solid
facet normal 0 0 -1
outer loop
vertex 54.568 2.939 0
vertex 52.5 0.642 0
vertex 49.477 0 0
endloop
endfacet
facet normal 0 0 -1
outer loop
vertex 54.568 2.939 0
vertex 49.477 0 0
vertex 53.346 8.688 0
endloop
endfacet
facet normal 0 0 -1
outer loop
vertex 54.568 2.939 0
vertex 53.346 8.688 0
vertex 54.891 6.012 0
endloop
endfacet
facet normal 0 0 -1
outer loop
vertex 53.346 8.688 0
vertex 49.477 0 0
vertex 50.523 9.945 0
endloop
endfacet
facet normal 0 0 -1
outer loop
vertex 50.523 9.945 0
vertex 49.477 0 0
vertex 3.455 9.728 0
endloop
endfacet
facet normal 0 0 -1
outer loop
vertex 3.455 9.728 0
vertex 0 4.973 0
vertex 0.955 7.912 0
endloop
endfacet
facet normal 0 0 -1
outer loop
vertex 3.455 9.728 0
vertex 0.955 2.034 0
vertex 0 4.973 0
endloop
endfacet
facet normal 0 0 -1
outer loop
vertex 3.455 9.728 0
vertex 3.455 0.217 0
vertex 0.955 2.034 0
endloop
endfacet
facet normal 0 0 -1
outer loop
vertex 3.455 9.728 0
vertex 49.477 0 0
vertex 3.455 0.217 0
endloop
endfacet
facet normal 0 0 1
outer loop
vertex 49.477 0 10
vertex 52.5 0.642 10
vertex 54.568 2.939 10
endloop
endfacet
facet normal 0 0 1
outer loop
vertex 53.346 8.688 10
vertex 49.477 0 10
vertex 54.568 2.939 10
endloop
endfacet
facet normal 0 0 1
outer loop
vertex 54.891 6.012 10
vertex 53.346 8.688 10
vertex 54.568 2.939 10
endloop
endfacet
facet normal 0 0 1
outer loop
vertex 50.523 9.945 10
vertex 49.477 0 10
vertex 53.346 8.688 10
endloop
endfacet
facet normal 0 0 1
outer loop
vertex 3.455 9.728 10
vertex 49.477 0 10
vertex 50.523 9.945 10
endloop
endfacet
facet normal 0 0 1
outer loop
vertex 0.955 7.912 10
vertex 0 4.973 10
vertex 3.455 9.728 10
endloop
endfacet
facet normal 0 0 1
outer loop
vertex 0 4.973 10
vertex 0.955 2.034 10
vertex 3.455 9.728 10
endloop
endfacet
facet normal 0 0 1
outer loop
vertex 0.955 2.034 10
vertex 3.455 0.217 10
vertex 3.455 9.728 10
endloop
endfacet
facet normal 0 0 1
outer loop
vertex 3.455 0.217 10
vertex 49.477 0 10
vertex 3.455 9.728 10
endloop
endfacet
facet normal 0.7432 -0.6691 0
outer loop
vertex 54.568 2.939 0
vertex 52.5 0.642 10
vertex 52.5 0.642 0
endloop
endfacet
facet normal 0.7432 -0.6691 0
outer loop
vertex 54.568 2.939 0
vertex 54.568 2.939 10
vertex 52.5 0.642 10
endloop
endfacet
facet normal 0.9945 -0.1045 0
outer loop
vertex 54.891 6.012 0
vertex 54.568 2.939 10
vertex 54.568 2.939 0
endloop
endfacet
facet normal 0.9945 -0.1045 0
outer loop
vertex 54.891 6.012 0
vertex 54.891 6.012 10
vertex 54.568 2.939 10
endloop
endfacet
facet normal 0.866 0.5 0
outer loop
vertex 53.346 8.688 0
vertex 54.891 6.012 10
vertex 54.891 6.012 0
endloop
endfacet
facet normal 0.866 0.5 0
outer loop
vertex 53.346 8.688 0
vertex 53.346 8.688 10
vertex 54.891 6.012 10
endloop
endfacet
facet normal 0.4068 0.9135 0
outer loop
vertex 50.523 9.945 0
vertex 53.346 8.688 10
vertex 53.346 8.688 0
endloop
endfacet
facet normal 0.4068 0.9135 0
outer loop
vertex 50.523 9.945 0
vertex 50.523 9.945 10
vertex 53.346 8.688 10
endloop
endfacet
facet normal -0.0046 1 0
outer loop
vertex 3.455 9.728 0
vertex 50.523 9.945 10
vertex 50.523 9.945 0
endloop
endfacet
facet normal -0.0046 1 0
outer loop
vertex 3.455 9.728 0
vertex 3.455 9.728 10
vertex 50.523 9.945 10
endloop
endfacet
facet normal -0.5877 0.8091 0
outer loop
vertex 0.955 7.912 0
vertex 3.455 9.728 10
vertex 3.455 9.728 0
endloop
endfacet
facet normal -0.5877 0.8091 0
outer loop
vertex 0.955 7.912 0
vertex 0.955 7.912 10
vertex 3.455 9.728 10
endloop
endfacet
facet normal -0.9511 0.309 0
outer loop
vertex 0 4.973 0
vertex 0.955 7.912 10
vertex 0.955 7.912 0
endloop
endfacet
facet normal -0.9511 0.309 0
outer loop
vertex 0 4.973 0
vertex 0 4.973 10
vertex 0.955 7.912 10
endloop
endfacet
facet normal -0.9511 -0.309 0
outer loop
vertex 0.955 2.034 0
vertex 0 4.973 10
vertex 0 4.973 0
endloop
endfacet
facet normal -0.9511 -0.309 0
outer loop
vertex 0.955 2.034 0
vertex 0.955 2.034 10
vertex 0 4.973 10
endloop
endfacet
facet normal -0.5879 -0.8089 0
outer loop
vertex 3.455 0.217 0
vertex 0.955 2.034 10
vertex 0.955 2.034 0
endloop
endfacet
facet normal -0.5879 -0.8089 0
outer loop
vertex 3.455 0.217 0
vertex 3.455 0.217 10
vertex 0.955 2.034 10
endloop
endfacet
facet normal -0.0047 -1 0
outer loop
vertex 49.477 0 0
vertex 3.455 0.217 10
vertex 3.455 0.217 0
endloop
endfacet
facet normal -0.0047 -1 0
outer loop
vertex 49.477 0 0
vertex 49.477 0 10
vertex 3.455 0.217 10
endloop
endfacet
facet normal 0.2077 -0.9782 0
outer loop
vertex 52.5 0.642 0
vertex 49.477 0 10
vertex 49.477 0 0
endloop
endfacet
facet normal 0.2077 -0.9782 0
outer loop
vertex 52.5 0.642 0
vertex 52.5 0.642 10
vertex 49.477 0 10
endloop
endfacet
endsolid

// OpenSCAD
$fn = 32;

// ----------------------------------------------------------------------
// Key bar: parallel key, 10 mm thick
// ----------------------------------------------------------------------

// --- parameters (mm) ---
profile_height = 10;      // extrusion height
profile_points = 11;      // points of the closed outline

profile = [[0, 4.973], [0.955, 2.034], [3.455, 0.217], [49.477, 0], [52.5, 0.642], [54.568, 2.939], [54.891, 6.012], [53.346, 8.688], [50.523, 9.945], [3.455, 9.728], [0.955, 7.912]];  // single closed polygon, 11 points, counter clockwise

// --- the one profile operation ---
linear_extrude(height = profile_height) polygon(points = profile);
